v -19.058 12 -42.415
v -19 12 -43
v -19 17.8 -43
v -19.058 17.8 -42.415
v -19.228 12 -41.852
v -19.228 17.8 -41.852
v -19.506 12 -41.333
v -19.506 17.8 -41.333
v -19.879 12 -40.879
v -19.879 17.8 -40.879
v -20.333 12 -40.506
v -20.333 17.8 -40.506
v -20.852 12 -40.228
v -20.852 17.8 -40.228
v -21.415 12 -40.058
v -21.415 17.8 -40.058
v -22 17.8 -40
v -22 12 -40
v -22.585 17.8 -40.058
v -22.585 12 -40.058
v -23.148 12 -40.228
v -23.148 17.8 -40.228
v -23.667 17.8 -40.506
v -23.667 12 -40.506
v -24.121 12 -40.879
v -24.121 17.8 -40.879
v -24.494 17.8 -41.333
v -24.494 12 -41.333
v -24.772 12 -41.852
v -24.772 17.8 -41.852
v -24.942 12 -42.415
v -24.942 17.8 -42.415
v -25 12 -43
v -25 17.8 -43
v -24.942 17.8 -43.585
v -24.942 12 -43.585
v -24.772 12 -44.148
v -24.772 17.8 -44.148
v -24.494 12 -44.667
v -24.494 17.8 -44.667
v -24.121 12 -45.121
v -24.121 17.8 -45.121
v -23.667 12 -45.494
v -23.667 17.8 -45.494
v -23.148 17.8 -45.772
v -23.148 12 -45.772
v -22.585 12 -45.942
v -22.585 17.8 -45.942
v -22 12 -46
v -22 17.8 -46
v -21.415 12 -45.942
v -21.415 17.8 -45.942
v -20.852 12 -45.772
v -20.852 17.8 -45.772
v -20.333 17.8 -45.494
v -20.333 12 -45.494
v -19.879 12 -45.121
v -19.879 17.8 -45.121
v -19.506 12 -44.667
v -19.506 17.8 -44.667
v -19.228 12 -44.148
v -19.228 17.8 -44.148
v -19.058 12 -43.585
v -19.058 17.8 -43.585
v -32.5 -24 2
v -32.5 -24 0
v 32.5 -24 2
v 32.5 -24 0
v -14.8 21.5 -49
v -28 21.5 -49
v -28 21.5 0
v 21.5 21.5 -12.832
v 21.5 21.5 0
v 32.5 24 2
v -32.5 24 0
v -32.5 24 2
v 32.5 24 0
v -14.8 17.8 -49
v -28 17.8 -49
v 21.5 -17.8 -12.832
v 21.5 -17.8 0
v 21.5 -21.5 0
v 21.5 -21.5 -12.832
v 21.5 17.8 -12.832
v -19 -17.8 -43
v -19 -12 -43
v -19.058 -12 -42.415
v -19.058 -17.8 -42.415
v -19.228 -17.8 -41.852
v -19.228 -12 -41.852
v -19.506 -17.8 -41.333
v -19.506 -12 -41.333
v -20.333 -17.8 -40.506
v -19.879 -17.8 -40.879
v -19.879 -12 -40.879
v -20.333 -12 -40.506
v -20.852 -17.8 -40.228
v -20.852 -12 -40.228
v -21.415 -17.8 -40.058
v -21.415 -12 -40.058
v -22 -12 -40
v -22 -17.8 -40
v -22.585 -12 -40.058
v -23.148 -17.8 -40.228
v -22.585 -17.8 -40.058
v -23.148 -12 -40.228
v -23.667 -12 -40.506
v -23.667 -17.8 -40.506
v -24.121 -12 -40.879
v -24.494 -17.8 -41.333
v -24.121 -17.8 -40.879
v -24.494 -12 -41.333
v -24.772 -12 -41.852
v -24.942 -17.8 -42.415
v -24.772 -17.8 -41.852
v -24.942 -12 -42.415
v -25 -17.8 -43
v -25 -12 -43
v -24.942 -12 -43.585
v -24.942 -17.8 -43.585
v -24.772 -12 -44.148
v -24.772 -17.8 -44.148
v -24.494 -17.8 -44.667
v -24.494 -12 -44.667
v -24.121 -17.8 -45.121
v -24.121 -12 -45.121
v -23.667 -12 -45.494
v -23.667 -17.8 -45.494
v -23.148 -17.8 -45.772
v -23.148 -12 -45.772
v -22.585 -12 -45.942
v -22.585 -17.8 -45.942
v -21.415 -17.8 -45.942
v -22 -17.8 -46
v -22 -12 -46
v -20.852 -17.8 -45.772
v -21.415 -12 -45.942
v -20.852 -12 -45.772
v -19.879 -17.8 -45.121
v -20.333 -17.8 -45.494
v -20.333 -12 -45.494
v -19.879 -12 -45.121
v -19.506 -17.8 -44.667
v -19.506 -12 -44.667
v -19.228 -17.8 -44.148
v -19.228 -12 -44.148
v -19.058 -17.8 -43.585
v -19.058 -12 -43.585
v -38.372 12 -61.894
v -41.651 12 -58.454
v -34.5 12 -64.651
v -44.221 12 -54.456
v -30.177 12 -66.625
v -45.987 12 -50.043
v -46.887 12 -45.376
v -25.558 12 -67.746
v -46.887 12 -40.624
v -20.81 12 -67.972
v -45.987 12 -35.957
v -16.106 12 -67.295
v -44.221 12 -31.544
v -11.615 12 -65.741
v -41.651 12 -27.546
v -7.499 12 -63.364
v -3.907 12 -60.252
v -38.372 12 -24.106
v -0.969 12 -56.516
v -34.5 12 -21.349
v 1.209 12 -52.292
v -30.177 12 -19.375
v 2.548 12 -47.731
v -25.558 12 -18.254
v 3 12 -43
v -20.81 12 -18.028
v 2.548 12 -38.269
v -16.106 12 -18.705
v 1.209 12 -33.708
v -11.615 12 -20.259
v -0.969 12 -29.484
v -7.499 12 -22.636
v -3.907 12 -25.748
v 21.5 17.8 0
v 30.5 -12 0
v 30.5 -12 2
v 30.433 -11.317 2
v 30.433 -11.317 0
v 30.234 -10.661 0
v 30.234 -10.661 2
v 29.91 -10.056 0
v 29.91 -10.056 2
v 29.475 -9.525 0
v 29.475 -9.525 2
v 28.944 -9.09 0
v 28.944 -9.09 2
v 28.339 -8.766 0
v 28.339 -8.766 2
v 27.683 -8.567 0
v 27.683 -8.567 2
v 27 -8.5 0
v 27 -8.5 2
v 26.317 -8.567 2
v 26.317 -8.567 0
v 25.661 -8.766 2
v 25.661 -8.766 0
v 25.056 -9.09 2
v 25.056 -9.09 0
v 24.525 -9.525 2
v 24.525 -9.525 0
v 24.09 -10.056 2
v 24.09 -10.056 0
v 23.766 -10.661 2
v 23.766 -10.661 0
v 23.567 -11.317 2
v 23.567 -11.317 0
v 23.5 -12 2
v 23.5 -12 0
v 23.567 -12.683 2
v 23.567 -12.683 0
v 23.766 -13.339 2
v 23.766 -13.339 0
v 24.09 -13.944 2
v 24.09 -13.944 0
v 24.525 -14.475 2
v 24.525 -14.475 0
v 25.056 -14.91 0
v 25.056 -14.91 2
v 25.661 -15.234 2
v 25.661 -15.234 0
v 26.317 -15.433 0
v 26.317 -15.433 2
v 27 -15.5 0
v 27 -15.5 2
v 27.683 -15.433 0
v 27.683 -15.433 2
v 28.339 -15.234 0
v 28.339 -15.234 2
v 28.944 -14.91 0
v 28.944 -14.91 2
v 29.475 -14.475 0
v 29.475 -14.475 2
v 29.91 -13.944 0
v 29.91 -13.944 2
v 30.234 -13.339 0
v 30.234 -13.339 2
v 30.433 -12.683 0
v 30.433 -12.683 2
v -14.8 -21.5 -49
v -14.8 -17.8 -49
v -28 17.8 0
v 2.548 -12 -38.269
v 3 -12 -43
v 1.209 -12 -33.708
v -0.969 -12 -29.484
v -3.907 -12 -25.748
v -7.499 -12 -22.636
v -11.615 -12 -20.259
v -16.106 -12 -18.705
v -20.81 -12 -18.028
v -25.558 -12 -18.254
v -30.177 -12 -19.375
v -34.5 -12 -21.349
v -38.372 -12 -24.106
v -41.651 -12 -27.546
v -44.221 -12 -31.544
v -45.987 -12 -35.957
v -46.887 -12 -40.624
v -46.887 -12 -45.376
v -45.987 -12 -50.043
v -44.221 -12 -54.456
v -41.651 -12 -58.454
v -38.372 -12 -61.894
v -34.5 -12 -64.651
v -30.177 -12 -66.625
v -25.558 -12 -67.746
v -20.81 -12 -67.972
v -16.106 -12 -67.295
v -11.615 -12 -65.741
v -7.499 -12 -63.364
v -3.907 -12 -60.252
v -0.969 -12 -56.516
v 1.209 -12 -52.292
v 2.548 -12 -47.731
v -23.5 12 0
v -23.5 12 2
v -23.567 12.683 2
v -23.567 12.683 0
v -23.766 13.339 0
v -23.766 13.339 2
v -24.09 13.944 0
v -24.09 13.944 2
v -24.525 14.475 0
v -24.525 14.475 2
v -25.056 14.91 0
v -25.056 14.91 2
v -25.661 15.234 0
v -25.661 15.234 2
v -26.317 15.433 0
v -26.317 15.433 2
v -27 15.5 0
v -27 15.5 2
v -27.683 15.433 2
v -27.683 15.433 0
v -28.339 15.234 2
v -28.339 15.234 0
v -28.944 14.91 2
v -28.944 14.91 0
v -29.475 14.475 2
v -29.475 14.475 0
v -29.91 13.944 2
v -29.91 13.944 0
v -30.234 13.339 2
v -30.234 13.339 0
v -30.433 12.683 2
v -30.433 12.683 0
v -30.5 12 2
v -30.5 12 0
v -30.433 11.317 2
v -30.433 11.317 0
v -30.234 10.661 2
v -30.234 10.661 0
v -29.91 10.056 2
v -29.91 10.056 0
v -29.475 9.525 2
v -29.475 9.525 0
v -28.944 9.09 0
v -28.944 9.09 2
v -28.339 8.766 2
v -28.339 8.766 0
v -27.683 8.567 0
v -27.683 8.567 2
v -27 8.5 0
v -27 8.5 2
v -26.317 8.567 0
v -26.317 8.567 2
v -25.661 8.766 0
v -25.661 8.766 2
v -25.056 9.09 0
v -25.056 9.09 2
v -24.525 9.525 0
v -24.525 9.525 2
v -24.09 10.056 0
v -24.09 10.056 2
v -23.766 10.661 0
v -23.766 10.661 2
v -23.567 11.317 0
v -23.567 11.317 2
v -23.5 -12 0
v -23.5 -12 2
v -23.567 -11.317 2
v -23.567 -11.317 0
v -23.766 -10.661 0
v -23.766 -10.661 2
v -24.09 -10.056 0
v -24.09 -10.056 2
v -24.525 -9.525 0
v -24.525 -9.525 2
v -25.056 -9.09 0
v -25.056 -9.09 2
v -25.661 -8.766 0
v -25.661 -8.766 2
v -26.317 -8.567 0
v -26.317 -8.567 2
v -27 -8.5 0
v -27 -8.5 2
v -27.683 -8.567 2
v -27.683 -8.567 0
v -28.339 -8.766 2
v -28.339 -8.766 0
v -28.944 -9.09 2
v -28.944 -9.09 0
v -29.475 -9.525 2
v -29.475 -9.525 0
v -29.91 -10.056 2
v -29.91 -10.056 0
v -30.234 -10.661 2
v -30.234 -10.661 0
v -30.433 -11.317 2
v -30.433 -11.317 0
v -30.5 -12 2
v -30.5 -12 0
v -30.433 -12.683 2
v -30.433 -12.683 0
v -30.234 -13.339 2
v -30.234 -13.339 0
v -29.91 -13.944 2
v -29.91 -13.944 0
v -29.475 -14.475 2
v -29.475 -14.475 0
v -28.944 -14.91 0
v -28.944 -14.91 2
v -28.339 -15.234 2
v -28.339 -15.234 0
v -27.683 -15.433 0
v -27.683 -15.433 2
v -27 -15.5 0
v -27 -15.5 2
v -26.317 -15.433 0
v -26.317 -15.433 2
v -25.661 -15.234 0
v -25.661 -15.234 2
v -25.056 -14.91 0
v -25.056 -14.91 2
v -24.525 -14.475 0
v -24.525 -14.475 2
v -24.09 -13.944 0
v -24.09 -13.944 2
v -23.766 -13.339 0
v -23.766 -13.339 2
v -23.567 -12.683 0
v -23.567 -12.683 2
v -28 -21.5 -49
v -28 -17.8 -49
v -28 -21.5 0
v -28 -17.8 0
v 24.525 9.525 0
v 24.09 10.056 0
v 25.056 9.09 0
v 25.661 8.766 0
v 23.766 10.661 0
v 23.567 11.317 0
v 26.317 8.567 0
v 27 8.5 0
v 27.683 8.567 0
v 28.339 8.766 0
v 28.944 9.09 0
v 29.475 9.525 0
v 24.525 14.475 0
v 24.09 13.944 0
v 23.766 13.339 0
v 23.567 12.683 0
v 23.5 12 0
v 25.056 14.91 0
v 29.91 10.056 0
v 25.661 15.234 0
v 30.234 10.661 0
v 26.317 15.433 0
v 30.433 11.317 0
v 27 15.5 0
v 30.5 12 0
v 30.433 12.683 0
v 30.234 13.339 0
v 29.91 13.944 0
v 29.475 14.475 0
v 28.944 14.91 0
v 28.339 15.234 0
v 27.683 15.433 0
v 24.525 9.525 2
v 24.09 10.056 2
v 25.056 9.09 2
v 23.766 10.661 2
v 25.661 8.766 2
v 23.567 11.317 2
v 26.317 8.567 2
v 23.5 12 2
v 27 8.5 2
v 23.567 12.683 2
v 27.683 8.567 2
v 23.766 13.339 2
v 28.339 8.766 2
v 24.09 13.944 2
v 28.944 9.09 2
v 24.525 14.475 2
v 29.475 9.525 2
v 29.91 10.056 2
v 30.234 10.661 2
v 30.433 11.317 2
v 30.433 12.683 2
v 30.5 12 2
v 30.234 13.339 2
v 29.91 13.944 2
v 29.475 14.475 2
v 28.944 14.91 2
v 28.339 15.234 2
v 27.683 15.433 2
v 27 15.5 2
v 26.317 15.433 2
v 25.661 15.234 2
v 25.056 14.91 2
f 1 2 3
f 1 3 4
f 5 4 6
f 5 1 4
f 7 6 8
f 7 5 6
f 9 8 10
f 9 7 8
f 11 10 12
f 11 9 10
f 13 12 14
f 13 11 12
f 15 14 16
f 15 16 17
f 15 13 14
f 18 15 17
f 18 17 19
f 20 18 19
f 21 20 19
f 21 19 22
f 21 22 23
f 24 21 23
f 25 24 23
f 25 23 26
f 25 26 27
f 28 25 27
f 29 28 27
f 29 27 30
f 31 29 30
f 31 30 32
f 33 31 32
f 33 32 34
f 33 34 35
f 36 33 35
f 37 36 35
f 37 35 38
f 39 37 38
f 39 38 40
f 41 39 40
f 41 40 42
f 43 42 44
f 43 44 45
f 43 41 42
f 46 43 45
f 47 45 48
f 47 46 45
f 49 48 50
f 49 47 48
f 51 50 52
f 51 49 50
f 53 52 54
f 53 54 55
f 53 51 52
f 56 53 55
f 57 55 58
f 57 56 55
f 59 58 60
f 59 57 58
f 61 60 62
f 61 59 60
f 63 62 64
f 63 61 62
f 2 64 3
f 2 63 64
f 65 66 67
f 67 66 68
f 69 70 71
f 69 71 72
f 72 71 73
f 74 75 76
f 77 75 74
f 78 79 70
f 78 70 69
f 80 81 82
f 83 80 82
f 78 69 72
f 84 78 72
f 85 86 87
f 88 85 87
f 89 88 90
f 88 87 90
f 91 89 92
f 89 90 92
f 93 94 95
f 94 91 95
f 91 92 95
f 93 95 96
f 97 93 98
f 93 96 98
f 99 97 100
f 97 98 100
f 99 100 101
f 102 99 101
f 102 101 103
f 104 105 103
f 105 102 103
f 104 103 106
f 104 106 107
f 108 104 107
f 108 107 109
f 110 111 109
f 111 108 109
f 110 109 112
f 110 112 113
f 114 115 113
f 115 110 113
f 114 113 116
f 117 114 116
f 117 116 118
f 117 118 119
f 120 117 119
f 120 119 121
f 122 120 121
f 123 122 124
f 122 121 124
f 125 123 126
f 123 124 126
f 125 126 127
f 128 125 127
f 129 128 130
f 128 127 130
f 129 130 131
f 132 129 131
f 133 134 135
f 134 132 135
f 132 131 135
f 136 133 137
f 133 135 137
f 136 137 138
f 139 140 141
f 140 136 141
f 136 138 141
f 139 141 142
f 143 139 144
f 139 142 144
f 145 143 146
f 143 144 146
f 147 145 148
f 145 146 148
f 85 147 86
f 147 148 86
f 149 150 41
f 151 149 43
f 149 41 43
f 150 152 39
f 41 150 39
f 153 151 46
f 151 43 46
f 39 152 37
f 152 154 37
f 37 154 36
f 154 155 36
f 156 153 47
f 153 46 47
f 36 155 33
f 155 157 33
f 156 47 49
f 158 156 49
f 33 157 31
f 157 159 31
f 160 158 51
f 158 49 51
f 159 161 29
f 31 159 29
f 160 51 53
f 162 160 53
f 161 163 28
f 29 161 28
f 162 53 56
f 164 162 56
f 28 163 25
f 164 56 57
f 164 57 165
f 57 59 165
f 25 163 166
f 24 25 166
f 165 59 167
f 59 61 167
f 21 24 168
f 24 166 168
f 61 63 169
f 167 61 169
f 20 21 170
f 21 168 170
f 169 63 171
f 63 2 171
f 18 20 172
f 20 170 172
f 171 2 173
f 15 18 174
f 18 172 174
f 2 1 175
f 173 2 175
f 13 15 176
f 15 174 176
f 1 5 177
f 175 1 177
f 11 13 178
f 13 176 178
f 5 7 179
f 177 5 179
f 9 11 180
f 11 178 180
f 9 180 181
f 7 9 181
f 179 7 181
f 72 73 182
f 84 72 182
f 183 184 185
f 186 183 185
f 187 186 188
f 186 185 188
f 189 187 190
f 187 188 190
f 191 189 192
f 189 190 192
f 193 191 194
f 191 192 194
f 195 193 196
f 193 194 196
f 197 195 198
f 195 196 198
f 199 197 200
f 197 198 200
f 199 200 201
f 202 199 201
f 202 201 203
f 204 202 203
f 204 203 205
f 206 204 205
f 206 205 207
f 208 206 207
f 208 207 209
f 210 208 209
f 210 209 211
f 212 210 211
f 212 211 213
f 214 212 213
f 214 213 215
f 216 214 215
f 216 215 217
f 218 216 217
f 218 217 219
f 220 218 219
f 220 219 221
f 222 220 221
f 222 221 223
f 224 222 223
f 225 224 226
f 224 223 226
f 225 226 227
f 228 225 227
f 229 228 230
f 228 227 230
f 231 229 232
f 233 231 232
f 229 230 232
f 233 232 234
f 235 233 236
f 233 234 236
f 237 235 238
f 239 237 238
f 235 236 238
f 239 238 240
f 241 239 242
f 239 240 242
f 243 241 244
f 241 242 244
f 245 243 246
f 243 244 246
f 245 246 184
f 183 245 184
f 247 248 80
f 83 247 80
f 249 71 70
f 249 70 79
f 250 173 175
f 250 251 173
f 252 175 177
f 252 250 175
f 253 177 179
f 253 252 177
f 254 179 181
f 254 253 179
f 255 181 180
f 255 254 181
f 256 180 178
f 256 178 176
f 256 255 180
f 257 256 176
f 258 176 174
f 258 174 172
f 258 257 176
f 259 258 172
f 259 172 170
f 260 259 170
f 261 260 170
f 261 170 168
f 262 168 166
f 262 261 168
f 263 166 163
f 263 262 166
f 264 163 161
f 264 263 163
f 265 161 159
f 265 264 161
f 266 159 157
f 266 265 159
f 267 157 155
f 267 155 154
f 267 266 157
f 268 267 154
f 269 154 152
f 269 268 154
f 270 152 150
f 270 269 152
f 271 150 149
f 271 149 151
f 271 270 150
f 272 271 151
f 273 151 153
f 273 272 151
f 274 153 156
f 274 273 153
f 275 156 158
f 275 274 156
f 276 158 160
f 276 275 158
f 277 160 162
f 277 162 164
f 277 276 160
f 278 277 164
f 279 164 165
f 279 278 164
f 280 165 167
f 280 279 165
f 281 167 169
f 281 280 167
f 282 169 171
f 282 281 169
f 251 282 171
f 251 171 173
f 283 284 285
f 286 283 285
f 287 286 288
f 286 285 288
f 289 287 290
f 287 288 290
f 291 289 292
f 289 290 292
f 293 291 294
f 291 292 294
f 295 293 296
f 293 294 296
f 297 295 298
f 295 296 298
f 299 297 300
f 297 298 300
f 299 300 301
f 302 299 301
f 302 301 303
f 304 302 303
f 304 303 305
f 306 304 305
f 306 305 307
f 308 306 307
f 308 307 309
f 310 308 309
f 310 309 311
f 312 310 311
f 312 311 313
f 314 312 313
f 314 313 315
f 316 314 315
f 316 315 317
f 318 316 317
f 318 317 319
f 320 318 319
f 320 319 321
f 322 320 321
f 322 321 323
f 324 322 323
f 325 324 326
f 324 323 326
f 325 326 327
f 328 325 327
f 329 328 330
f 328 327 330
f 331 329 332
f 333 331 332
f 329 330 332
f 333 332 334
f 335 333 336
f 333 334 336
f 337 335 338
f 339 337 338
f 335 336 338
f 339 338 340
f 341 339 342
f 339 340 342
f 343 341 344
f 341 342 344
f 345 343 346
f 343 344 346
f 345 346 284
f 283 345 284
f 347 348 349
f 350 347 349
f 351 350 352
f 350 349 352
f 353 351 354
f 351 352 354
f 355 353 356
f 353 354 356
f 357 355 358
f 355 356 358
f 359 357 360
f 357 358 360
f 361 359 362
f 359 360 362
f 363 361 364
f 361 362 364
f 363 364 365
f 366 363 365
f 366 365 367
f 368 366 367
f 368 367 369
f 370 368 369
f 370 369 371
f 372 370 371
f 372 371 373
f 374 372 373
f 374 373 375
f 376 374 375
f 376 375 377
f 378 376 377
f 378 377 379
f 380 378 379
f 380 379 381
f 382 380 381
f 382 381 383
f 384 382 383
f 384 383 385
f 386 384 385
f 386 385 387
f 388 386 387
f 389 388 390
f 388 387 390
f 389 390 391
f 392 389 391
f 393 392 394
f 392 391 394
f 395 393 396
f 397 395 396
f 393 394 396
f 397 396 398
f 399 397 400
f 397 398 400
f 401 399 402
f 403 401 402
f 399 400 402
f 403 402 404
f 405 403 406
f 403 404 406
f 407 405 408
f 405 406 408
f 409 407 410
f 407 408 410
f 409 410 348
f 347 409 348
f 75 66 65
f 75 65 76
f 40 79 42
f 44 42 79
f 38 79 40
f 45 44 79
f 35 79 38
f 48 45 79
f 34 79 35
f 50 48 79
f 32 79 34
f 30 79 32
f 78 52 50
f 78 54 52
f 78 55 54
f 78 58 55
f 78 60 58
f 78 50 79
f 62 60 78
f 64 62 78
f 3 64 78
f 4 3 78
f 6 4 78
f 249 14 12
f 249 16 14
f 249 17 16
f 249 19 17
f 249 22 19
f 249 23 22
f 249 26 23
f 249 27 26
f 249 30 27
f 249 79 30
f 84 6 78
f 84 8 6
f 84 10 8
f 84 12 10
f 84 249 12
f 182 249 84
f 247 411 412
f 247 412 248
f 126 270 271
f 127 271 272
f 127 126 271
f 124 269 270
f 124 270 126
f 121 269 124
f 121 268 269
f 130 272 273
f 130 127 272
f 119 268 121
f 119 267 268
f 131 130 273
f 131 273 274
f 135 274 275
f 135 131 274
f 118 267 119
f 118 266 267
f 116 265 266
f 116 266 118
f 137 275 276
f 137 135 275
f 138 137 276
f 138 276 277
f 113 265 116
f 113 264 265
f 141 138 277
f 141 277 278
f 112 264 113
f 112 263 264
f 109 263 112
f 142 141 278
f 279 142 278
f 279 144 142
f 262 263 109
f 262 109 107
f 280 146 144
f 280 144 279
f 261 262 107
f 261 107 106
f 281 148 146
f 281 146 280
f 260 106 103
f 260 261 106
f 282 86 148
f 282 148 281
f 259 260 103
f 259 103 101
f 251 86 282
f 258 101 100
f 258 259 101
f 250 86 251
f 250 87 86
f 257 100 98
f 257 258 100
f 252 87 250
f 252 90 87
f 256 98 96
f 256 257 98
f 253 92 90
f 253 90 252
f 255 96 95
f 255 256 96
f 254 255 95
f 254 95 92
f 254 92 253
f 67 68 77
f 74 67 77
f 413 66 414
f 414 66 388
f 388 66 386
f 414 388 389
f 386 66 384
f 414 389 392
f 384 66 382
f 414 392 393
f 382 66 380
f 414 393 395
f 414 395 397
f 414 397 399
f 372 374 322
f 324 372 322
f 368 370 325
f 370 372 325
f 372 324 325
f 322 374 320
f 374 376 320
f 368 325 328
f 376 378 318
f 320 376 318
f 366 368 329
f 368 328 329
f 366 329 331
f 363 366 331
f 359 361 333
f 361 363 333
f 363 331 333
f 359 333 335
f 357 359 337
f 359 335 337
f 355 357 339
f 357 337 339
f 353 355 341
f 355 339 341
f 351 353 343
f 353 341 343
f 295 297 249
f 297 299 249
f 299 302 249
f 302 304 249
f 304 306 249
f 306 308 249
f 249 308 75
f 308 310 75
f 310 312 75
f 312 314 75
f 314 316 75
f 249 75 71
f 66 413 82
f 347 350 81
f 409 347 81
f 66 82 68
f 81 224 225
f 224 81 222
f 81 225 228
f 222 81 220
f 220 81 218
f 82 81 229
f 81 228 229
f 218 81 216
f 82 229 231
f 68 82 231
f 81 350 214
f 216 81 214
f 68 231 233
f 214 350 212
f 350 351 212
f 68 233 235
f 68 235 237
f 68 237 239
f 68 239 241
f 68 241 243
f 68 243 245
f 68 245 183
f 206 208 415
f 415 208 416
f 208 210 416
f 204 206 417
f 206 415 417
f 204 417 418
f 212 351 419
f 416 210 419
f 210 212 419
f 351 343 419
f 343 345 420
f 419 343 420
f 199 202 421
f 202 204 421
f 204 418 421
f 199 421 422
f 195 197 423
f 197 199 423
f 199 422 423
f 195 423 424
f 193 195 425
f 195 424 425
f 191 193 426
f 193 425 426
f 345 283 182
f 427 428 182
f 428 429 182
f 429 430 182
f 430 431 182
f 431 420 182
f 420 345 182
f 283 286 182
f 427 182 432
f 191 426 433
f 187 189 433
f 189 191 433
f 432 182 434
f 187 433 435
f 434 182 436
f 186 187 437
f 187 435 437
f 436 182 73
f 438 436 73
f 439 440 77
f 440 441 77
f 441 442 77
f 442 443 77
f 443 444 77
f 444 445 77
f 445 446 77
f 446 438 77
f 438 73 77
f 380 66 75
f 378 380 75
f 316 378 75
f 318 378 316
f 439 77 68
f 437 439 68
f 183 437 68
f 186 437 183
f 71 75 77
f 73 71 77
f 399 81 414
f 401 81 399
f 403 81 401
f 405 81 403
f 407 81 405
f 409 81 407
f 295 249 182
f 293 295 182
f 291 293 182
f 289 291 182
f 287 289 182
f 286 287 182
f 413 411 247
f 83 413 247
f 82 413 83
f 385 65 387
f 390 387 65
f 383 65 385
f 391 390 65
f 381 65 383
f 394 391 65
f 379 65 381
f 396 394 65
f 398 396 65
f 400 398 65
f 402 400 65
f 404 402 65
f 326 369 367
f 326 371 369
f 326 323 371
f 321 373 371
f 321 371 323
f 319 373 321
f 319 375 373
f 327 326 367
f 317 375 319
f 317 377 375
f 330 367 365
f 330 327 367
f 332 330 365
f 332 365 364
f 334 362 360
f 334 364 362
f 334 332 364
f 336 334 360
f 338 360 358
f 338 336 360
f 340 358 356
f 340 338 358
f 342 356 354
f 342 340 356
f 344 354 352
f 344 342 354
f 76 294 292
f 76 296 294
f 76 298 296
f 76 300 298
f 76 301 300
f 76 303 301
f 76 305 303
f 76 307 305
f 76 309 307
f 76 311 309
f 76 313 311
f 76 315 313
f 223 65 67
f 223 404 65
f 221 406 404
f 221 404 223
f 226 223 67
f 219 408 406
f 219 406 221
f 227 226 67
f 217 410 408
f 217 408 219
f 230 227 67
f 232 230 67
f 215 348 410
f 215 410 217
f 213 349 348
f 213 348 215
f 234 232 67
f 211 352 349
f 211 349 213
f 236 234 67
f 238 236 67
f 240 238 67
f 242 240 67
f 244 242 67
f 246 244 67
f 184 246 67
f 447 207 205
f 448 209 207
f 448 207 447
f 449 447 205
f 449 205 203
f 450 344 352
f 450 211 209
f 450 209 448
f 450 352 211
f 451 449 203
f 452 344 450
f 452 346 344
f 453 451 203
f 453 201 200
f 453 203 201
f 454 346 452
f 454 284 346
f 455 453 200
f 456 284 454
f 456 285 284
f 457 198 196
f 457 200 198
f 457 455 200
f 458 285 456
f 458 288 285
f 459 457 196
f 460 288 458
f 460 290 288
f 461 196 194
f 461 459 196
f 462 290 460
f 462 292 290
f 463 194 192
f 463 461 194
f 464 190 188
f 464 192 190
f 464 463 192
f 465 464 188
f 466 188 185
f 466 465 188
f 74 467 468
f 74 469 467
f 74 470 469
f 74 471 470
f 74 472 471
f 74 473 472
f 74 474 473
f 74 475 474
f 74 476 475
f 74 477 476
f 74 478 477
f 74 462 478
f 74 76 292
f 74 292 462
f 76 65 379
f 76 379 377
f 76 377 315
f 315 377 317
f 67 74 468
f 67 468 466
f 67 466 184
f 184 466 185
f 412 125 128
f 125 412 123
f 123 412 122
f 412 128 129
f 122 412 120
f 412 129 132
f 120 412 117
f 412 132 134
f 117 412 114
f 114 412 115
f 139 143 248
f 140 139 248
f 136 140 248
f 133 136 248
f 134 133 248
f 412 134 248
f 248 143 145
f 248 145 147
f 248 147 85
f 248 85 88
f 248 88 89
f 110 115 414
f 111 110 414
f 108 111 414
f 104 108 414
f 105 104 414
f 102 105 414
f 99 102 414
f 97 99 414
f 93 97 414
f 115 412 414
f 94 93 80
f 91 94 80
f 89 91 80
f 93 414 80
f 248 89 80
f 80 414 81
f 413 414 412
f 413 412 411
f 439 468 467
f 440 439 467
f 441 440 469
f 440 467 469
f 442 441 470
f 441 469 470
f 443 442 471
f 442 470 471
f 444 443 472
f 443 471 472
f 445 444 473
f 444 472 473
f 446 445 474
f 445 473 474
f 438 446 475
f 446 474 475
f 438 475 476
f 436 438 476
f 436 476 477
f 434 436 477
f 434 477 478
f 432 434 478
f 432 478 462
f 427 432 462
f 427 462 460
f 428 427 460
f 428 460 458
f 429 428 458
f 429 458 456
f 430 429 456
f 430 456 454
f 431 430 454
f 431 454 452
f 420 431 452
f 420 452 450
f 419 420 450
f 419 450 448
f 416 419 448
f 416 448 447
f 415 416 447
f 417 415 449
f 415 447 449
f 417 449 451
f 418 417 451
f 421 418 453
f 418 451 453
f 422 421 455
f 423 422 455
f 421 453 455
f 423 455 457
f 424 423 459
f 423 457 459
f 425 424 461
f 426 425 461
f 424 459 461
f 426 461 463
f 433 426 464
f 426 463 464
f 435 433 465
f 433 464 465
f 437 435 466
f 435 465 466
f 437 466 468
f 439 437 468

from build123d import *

# Parameters (mm, degrees)
F0_W           = 65
F0_H           = 48
F1_DEPTH       = 2
F2_W           = 49.5
F2_H           = 3.7
F3_DEPTH       = 49
F5_DEPTH       = 58
F6_R           = 25
F7_DEPTH       = 12
F8_R           = 3.5
F9_DEPTH       = 5
F11_R          = 3
F12_DEPTH      = 18
F12_DEPTH_BACK = 18
F13_R          = 25
F14_DEPTH      = 12
F14_DEPTH_BACK = 12


with BuildPart() as f1:
    # F0 (on Top) → F1 (new body)
    with BuildSketch(Plane.XY):
        Rectangle(F0_W, F0_H)
    extrude(amount=F1_DEPTH)

    # F2 (on face) → F3 (join)
    with BuildSketch(Plane(origin=(0, 0, 0), x_dir=(1, 0, 0), z_dir=(0, 0, -1))):
        with Locations((-3.25, 19.65)):
            Rectangle(F2_W, F2_H)
        with Locations((-3.25, -19.65)):
            Rectangle(F2_W, F2_H)
    extrude(amount=F3_DEPTH)

    # F4 (on face) → F5 (cut)
    with BuildSketch(Plane(origin=(0, 21.5, 0), x_dir=(-1, 0, 0), z_dir=(0, 1, 0))):
        Polygon((-21.5, -49), (14.8, -49), (-21.5, -12.831701), align=None)
    extrude(amount=-F5_DEPTH, mode=Mode.SUBTRACT)

    # F8 (on face) → F9 (cut)
    with BuildSketch(Plane.XY.offset(2)):
        with Locations((27, -12)):
            Circle(F8_R)
        with Locations((-27, -12)):
            Circle(F8_R)
        with Locations((-27, 12)):
            Circle(F8_R)
        with Locations((27, 12)):
            Circle(F8_R)
    extrude(amount=-F9_DEPTH, mode=Mode.SUBTRACT)

    # F11 (on Front) → F12 (join, two sides)
    with BuildSketch(Plane.XZ) as f12_sk:
        with Locations((-22, -43)):
            Circle(F11_R)
    extrude(amount=F12_DEPTH)
    extrude(f12_sk.sketch, amount=-F12_DEPTH_BACK)

    # F13 (on Front) → F14 (join, two sides)
    with BuildSketch(Plane.XZ) as f14_sk:
        with Locations((-22, -43)):
            Circle(F13_R)
    extrude(amount=F14_DEPTH)
    extrude(f14_sk.sketch, amount=-F14_DEPTH_BACK)


with BuildPart() as f7:
    # F6 (on Front) → F7 (new body, symmetric)
    with BuildSketch(Plane.XZ):
        with Locations((-22, -43)):
            Circle(F6_R)
    extrude(amount=F7_DEPTH, both=True)


solid = f1.part
